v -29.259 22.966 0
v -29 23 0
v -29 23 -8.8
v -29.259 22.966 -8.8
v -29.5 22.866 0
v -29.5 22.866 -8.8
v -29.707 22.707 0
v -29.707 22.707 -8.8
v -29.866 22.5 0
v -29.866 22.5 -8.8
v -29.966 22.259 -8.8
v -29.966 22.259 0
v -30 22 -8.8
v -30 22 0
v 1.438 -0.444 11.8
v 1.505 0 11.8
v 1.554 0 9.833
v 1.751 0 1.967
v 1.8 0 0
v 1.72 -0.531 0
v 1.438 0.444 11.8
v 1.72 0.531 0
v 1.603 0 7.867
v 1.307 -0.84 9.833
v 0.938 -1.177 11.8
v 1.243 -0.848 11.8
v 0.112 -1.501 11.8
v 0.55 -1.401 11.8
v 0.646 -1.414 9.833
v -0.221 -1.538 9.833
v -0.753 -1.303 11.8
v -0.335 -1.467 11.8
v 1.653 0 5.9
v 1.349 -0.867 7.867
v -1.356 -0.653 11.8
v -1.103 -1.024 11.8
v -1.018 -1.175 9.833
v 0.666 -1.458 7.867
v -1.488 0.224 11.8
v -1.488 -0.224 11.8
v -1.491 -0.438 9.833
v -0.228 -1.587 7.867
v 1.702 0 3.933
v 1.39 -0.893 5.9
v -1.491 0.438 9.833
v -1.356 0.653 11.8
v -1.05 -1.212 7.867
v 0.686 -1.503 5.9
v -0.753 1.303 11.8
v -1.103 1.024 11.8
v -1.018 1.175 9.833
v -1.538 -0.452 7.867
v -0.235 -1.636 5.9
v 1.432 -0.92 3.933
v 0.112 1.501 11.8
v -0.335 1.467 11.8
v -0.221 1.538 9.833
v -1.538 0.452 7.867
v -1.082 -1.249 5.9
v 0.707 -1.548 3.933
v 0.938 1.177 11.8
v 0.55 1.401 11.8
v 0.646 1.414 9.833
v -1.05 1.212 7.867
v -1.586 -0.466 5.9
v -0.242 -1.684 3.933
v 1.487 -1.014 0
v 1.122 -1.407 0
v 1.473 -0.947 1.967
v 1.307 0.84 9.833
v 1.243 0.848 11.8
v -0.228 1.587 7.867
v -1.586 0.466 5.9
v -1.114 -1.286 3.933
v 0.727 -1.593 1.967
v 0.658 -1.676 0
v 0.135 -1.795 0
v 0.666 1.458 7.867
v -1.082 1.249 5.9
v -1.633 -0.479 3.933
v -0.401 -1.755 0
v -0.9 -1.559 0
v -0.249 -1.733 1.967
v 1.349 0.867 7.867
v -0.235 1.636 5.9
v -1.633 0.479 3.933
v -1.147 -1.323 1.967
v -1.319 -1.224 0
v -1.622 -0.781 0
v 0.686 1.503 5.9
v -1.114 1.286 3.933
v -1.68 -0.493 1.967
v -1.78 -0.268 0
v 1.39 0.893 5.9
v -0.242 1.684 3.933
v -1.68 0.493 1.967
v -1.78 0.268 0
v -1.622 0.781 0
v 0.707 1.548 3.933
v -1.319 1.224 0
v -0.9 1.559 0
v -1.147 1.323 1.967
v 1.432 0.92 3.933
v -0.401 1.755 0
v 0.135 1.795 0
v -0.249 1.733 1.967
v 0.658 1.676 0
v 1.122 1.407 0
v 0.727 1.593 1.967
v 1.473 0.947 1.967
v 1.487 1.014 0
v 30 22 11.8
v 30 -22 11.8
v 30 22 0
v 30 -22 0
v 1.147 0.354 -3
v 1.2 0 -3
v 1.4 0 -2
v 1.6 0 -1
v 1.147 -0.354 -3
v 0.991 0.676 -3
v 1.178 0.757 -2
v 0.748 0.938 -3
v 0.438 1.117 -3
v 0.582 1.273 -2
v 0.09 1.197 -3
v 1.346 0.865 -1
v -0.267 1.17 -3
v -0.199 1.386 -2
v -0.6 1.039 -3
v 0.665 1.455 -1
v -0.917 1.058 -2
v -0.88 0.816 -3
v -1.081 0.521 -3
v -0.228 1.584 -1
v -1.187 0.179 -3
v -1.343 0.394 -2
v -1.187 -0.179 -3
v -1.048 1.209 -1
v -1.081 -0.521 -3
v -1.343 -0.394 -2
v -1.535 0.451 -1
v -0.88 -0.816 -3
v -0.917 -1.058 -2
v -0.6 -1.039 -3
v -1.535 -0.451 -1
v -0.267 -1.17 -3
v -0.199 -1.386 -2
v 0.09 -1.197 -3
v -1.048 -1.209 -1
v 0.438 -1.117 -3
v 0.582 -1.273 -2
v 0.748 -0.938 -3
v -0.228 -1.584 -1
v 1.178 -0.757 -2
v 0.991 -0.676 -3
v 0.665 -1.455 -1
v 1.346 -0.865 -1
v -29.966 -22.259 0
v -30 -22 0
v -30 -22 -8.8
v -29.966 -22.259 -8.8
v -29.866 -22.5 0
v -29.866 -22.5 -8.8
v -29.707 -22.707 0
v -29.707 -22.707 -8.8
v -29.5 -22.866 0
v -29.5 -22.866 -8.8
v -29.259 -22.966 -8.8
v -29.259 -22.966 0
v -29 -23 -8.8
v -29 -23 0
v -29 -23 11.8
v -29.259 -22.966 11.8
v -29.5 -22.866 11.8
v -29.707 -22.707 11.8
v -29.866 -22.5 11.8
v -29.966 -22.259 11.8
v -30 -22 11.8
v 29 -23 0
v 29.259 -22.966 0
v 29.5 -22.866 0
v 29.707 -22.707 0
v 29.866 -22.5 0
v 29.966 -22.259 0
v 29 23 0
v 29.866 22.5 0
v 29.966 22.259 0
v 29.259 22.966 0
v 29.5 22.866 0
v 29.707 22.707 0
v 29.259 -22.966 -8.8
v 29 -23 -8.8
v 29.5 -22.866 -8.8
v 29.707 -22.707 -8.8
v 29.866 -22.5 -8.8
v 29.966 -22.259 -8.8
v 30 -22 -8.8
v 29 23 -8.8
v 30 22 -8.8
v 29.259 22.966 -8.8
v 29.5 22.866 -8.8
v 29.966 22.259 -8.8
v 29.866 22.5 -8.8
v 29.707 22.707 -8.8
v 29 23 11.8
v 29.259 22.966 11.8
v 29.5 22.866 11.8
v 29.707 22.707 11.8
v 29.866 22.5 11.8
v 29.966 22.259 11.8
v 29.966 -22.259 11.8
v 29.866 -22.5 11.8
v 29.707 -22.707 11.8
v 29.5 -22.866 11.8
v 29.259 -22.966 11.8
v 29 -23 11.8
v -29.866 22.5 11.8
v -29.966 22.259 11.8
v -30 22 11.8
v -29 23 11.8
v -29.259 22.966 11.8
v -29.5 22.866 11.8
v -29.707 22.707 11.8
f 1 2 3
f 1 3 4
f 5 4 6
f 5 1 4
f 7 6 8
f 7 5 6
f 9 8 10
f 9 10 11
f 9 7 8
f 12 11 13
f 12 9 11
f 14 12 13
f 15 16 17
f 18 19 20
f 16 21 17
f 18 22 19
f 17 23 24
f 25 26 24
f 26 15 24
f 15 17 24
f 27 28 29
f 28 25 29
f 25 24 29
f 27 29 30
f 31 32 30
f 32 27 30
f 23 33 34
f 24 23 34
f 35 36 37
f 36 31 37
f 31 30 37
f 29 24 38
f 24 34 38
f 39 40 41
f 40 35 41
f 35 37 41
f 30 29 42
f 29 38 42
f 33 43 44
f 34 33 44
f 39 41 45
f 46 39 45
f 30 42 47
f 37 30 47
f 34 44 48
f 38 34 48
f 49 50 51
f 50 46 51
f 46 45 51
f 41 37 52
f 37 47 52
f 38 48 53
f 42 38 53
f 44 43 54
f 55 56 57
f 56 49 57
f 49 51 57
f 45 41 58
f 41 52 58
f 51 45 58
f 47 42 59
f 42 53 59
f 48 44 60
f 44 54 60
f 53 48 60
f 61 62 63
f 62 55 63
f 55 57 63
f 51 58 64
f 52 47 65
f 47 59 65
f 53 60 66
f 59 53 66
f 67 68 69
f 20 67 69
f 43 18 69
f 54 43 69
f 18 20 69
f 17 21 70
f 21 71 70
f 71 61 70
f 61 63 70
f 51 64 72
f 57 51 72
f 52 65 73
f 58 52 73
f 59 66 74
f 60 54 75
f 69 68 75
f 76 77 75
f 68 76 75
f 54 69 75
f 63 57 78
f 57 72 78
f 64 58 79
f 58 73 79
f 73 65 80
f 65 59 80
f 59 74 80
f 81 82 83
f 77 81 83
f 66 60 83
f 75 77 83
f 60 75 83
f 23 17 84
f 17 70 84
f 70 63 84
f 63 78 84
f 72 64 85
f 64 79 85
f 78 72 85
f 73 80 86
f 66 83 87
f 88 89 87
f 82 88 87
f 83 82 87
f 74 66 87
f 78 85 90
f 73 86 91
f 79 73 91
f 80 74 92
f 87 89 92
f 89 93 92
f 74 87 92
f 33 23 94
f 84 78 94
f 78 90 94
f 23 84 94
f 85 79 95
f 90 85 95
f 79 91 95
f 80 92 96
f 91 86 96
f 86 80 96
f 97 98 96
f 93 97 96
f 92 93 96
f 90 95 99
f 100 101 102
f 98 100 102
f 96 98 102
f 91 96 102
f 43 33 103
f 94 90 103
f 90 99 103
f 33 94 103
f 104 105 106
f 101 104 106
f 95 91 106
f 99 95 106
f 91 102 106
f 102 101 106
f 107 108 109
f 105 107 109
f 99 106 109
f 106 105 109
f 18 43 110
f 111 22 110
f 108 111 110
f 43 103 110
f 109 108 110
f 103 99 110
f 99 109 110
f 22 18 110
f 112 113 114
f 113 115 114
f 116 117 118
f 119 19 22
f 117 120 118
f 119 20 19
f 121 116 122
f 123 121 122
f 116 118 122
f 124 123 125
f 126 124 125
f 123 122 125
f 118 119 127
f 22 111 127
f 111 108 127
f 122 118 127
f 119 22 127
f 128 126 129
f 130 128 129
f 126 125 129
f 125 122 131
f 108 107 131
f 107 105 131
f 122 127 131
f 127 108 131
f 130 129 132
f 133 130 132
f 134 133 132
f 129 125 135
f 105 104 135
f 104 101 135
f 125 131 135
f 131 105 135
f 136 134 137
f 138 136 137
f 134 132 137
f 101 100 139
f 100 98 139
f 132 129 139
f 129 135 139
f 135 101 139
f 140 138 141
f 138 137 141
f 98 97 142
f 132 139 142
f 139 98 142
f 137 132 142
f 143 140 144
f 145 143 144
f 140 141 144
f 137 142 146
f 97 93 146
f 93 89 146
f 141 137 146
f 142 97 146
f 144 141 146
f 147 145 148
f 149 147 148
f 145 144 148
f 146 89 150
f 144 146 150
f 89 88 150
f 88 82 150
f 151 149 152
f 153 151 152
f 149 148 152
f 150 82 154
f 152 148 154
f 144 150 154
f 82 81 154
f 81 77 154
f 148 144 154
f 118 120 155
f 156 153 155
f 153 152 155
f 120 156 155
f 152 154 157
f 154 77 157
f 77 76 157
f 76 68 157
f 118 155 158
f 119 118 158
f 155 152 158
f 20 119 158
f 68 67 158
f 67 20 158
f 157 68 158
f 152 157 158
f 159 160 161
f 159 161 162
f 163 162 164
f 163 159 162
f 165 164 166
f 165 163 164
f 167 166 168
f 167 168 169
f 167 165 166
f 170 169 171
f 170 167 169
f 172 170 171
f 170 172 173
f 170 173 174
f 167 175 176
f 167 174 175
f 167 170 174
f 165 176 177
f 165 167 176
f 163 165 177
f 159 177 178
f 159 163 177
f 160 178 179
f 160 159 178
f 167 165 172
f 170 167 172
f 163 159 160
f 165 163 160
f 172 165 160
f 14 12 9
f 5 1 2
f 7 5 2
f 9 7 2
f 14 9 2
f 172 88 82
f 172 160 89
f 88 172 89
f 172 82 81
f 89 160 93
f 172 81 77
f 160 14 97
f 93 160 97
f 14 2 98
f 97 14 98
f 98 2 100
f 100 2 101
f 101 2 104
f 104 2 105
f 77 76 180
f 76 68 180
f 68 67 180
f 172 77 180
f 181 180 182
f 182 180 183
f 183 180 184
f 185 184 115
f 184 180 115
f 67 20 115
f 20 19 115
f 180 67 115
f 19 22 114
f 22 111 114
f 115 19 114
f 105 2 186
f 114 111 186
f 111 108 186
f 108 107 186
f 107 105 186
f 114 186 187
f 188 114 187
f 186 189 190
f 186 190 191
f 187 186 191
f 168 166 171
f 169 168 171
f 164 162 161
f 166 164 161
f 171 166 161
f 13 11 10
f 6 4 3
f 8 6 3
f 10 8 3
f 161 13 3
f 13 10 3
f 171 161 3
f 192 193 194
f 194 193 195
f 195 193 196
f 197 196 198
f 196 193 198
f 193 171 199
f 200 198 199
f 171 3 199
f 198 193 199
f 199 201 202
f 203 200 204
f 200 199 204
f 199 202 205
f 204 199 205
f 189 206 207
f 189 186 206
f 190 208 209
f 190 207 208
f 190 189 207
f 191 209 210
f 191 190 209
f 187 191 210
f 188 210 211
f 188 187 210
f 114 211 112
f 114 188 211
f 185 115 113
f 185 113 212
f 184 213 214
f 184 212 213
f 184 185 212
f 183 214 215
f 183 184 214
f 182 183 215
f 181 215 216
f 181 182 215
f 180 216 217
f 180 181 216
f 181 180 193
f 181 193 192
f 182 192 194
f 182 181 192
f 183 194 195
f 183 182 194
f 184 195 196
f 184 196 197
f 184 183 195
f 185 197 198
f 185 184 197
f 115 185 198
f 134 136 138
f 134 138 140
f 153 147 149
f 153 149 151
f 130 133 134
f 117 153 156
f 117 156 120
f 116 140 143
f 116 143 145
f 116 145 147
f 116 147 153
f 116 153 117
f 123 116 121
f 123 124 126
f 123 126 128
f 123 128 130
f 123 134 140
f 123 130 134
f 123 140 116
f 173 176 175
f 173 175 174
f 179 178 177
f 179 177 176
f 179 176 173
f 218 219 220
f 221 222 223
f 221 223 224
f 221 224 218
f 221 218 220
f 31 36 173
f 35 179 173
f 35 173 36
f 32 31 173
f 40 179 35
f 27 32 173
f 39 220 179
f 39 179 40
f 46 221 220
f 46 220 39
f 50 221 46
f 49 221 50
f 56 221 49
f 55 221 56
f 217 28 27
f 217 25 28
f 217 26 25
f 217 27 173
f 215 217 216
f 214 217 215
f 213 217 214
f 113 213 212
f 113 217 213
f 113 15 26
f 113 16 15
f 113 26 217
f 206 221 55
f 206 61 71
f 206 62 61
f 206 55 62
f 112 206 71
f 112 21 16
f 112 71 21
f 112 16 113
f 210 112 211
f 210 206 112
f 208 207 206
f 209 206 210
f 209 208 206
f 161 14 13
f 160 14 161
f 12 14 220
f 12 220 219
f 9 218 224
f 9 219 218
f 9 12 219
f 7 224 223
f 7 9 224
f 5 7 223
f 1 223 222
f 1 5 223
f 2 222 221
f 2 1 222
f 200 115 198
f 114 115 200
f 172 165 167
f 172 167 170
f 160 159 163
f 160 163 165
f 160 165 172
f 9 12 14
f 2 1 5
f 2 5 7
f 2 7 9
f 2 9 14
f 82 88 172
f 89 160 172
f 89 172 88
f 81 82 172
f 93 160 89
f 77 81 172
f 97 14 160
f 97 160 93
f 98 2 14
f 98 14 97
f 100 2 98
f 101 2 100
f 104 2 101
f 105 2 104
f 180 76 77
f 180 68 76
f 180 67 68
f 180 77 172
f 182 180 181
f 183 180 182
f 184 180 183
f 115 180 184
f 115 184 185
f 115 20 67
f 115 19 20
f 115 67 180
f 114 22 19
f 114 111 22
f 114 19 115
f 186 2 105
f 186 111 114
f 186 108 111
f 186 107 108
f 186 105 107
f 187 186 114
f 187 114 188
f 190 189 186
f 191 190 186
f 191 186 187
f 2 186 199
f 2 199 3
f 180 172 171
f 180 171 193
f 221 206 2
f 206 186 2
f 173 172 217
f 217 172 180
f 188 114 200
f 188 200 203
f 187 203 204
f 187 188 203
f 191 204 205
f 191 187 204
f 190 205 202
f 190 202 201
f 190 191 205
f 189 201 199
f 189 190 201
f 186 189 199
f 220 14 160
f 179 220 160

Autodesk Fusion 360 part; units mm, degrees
sketch "スケッチ7" plane through (0, 0, 0) normal (0, 0, 1) x (1, 0, 0)
  line L0 (-40, -25) -> (40, -25)
  line L1 (40, -25) -> (40, 25)
  line L2 (40, 25) -> (-40, 25)
  line L3 (-40, 25) -> (-40, -25)
  line L4 (-40, -25) -> (40, 25) construction
  line L5 (40, -25) -> (-40, 25) construction
  line L6 (-40, 0) -> (40, 0) construction
  line L7 (0, -25) -> (0, 25) construction
  circle A0 centre (-35, 20) radius 2.75
  circle A1 centre (35, 20) radius 2.75
  circle A2 centre (-35, -20) radius 2.75
  circle A3 centre (35, -20) radius 2.75
  line L8 (-29, -23) -> (29, -23)
  line L9 (30, -22) -> (30, 22)
  line L10 (29, 23) -> (-29, 23)
  line L11 (-30, 22) -> (-30, -22)
  line L12 (-30, -23) -> (30, 23) construction
  line L13 (30, -23) -> (-30, 23) construction
  arc A4 (-29, 23) -> (-30, 22) centre (-29, 22) ccw
  arc A5 (30, 22) -> (29, 23) centre (29, 22) ccw
  arc A6 (29, -23) -> (30, -22) centre (29, -22) ccw
  arc A7 (-30, -22) -> (-29, -23) centre (-29, -22) ccw
  circle A8 centre (0, 0) radius 1.5
  arc A9 (-6, 23) -> (6, 23) centre (0, 23) ccw
  arc A10 (-30, -8) -> (-30, 8) centre (-30, 0) ccw
  arc A11 (6, -23) -> (-6, -23) centre (0, -23) ccw
  arc A12 (30, 8) -> (30, -8) centre (30, 0) ccw
  dimension "d41" = 50
  dimension "d42" = 80
  dimension "d43" = 5.5
  dimension "d44" = 5
  dimension "d45" = 5
  dimension "d186" = 46
  dimension "d187" = 10
  dimension "d188" = 1
  dimension "d197" = 3
  dimension "d229" = 8
  dimension "d230" = 6
sketch "Runner" plane through (0, 0, 0) normal (0, 0, 1) x (1, 0, 0)
  line L0 (-14.6, 1.8) -> (-14.6, -1.8)
  arc A0 (-23, -0.6) -> (-21.8, -1.8) centre (-21.8, -0.6) ccw
  line L1 (-17, 1.8) -> (17, 1.8) construction
  line L2 (-14.6, 1.8) -> (-15.4, 3.5)
  line L3 (-17, -3.5) -> (-17, 3.5)
  line L4 (17, 1.8) -> (-17, -1.8) construction
  line L5 (0, 1.8) -> (0, -1.8) construction
  line L6 (-17, 3.5) -> (-15.4, 3.5)
  line L7 (-17, -1.8) -> (-17, 1.8)
  line L8 (-25, -3.5) -> (-9, -3.5) construction
  line L9 (-25.0006, 3.5) -> (-8.9994, 3.5) construction
  arc A1 (21.8, -1.8) -> (23, -0.6) centre (21.8, -0.6) ccw
  line L10 (-17, 1.8) -> (17, -1.8) construction
  line L11 (21.8, -1.8) -> (17, -1.8)
  line L12 (17, 1.8) -> (17, -1.8)
  line L13 (-17, 0) -> (17.3464, 0)
  line L14 (17, 0) -> (23, 0)
  line L15 (-17, 0) -> (-23, 0)
  line L16 (-14.6, -1.8) -> (-15.4, -3.5)
  line L17 (23, 0) -> (23, -0.6)
  line L18 (-17, -3.5) -> (-15.4, -3.5)
  line L19 (-15.4, -3.5) -> (-15.4, 3.5)
  line L20 (17, -1.8) -> (-17, -1.8)
  line L21 (-17, -1.8) -> (-17, 0)
  line L22 (-21.8, -1.8) -> (-17, -1.8)
  line L23 (-23, 0) -> (-23, -0.6)
  circle A2 centre (0, 0) radius 1.8
  circle A3 centre (0, 0) radius 1.5
  dimension "d202" = 1.6
  dimension "d204" = 0.8
  dimension "d210" = 6
  dimension "d211" = 1.2
  dimension "d212" = 3.5
  dimension "d213" = 3.5
  dimension "d214" = 3
  dimension "d215" = 3.6
  dimension "d216" = 17
sketch "スケッチ1" plane through (0, 0, 0) normal (0, 0, 1) x (1, 0, 0)
  line L0 (8.5, -3) -> (25.5, -3)
  line L1 (26, -3.5) -> (26, -20.5)
  line L2 (25.5, -21) -> (8.5, -21)
  line L3 (8, -20.5) -> (8, -3.5)
  line L4 (17, -3) -> (17, -21) construction
  line L5 (8, -12) -> (26, -12) construction
  arc A0 (8.5, -3) -> (8, -3.5) centre (8.5, -3.5) ccw
  arc A1 (26, -3.5) -> (25.5, -3) centre (25.5, -3.5) ccw
  arc A2 (25.5, -21) -> (26, -20.5) centre (25.5, -20.5) ccw
  arc A3 (8, -20.5) -> (8.5, -21) centre (8.5, -20.5) ccw
  line L6 (9.7, -4.2) -> (24.3, -4.2)
  line L7 (9.2, -19.3) -> (9.2, -4.7)
  line L8 (24.3, -19.8) -> (9.7, -19.8)
  line L9 (24.8, -4.7) -> (24.8, -19.3)
  arc A4 (9.7, -4.2) -> (9.2, -4.7) centre (9.7, -4.7) ccw
  arc A5 (9.2, -19.3) -> (9.7, -19.8) centre (9.7, -19.3) ccw
  arc A6 (24.3, -19.8) -> (24.8, -19.3) centre (24.3, -19.3) ccw
  arc A7 (24.8, -4.7) -> (24.3, -4.2) centre (24.3, -4.7) ccw
  circle A8 centre (17, -12.03) radius 2.7
  line L10 (14.3525, -11.5) -> (19.6475, -11.5) construction
  line L11 (14.3525, -12.5) -> (19.6475, -12.5) construction
  line L12 (16.5, -9.3767) -> (16.5, -14.6833) construction
  line L13 (17.5, -9.3767) -> (17.5, -14.6833) construction
  line L14 (16.5, -11.5) -> (14.5202, -11.5)
  line L15 (14.5202, -12.5) -> (14.5202, -11.5)
  line L16 (14.5202, -12.5) -> (16.5, -12.5)
  line L17 (15.0202, -11.5) -> (15.0202, -12.5)
  line L18 (16.5, -12.5) -> (16.5, -14.4798)
  line L19 (17.5, -14.4798) -> (17.5, -12.5)
  line L20 (16.5, -13.9798) -> (17.5, -13.9798)
  line L21 (17.5, -14.4798) -> (16.5, -14.4798)
  line L22 (17.5, -12.5) -> (19.4798, -12.5)
  line L23 (19.4798, -11.5) -> (17.5, -11.5)
  line L24 (18.9798, -12.5) -> (18.9798, -11.5)
  line L25 (19.4798, -11.5) -> (19.4798, -12.5)
  line L26 (17.5, -11.5) -> (17.5, -9.5202)
  line L27 (16.5, -9.5202) -> (16.5, -11.5)
  line L28 (17.5, -10.0202) -> (16.5, -10.0202)
  line L29 (16.5, -9.5202) -> (17.5, -9.5202)
  circle A9 centre (13.2, -15.7) radius 1.25
  circle A10 centre (20.8, -15.7) radius 1.25
  point P0 (8, -3)
  point P1 (8, -21)
  point P2 (14.3002, -12)
  point P3 (17, -12)
  dimension "d326" = 18
  dimension "d327" = 18
  dimension "d328" = 8
  dimension "d329" = 3
  dimension "d330" = 0.5
  dimension "d332" = 0.5
  dimension "d333" = 0.03
  dimension "d334" = 5.4
  dimension "d335" = 1.2
  dimension "d336" = 1.2
  dimension "d337" = 1
  dimension "d338" = 1
  dimension "d339" = 0.22
  dimension "d341" = 0.5
  dimension "d343" = 360
  dimension "d366" = 2.5
  dimension "d367" = 12.7
  dimension "d368" = 5.2
ref_plane "作業平面1" through (0, 0, 7.5) normal (0, 0, 1) x (1, 0, 0)
sketch "スケッチ2" plane through (0, 0, 7.5) normal (0, 0, 1) x (1, 0, 0)
  line L0 (8.5, -3) -> (25.5, -3) construction
  line L1 (8, -20.5) -> (8, -3.5) construction
  line L2 (25.5, -21) -> (8.5, -21) construction
  line L3 (26, -3.5) -> (26, -20.5) construction
  arc A0 (26, -3.5) -> (25.5, -3) centre (25.5, -3.5) ccw construction
  arc A1 (8.5, -3) -> (8, -3.5) centre (8.5, -3.5) ccw construction
  arc A2 (8, -20.5) -> (8.5, -21) centre (8.5, -20.5) ccw construction
  arc A3 (25.5, -21) -> (26, -20.5) centre (25.5, -20.5) ccw construction
  line L4 (17, -3) -> (17, -21) construction
  line L5 (8, -12) -> (26, -12) construction
  line L6 (12, -18) -> (22, -18)
  line L7 (23, -17) -> (23, -7)
  line L8 (22, -6) -> (12, -6)
  line L9 (11, -7) -> (11, -17)
  line L10 (11, -18) -> (23, -6) construction
  line L11 (23, -18) -> (11, -6) construction
  arc A4 (12, -6) -> (11, -7) centre (12, -7) ccw
  arc A5 (23, -7) -> (22, -6) centre (22, -7) ccw
  arc A6 (22, -18) -> (23, -17) centre (22, -17) ccw
  arc A7 (11, -17) -> (12, -18) centre (12, -17) ccw
  point P0 (17, -12)
  dimension "d396" = 12
  dimension "d397" = 12
  dimension "d398" = 1
ref_plane "作業平面4" through (0, 0, 6.3) normal (0, 0, 1) x (1, 0, 0)
sketch "スケッチ8" plane through (0, 0, 6.3) normal (0, 0, 1) x (1, 0, 0)
  line L0 (11, -7) -> (11, -17) construction
  line L1 (22, -6) -> (12, -6) construction
  arc A0 (12, -6) -> (11, -7) centre (12, -7) ccw construction
  arc A1 (11, -17) -> (12, -18) centre (12, -17) ccw construction
  line L2 (12, -18) -> (22, -18) construction
  line L3 (23, -17) -> (23, -7) construction
  arc A2 (23, -7) -> (22, -6) centre (22, -7) ccw construction
  arc A3 (22, -18) -> (23, -17) centre (22, -17) ccw construction
  line L4 (21.5, -7) -> (12.5, -7)
  line L5 (12, -7.5) -> (12, -16.5)
  line L6 (12.5, -17) -> (21.5, -17)
  line L7 (22, -16.5) -> (22, -7.5)
  arc A4 (12.5, -7) -> (12, -7.5) centre (12.5, -7.5) ccw
  arc A5 (22, -7.5) -> (21.5, -7) centre (21.5, -7.5) ccw
  arc A6 (21.5, -17) -> (22, -16.5) centre (21.5, -16.5) ccw
  arc A7 (12, -16.5) -> (12.5, -17) centre (12.5, -16.5) ccw
  line L8 (17, -6) -> (17, -18) construction
  line L9 (11, -12) -> (23, -12) construction
  dimension "d400" = 0.5
  dimension "d401" = 1
  dimension "d402" = 1
ref_plane "作業平面10" through (0, -12, 0) normal (0, 1, 0) x (0, 0, 1)
sketch "スケッチ28" plane through (0, -12, 0) normal (0, 1, 0) x (1, 0, 0)
  line L0 (17, -7.5) -> (17, 0) construction
  arc A0 (22, -6.3) -> (24.8, 0) centre (7.2558, 4.0252) ccw
  arc A1 (9.2, 0) -> (12, -6.3) centre (26.7442, 4.0252) ccw
  arc A2 (8, 0) -> (11, -7.5) centre (25.7864, 2.7646) ccw
  arc A3 (23, -7.5) -> (26, 0) centre (8.2136, 2.7646) ccw
  point P0 (17, -7.5)
  point P1 (17, 0)
  point P2 (22, -6.3)
  point P3 (12, -6.3)
  point P4 (24.8, 0)
  point P5 (9.2, 0)
  point P6 (11, -7.5)
  point P7 (23, -7.5)
  point P8 (26, 0)
  point P9 (8, 0)
  dimension "d405" = -12
ref_plane "作業平面11" through (17, -12, 3.75) normal (1, 0, 0) x (0, 0, -1)
ref_plane "作業平面12" through (17, -12, 3.75) normal (0.7071, 0.7071, 0) x (0, 0, -1)
sketch "スケッチ29" plane through (17, -12, 3.6) normal (1, 0, 0) x (0, 1, 0)
  arc A0 (-6, 3.9) -> (-9, -3.6) centre (8.7864, -6.3646) ccw
  line L0 (0, 3.9) -> (-0.03, -3.6)
  arc A1 (9, -3.6) -> (6, 3.9) centre (-8.7864, -6.3646) ccw
  arc A2 (-5, 2.7) -> (-7.8, -3.6) centre (9.7442, -7.6252) ccw
  arc A3 (7.8, -3.6) -> (5, 2.7) centre (-9.7442, -7.6252) ccw
  point P0 (6, 3.9)
  point P1 (-6, 3.9)
  point P2 (-9, -3.6)
  point P3 (0, 3.9)
  point P4 (-0.03, -3.6)
  point P5 (9, -3.6)
  point P6 (-7.8, -3.6)
  point P7 (7.8, -3.6)
  point P8 (-5, 2.7)
  point P9 (5, 2.7)
  dimension "d407" = 18
  dimension "d408" = 18
  dimension "d409" = 18
  dimension "d410" = 18
sketch "スケッチ27" plane through (0, 0, 0) normal (0, 0, 1) x (1, 0, 0)
  line L0 (8, -20.5) -> (8, -3.5) construction
  line L1 (8.5, -3) -> (25.5, -3) construction
  line L2 (26, -3.5) -> (26, -20.5) construction
  line L3 (25.5, -21) -> (8.5, -21) construction
  arc A0 (8, -20.5) -> (8.5, -21) centre (8.5, -20.5) ccw construction
  arc A1 (8.5, -3) -> (8, -3.5) centre (8.5, -3.5) ccw construction
  arc A2 (25.5, -21) -> (26, -20.5) centre (25.5, -20.5) ccw construction
  arc A3 (26, -3.5) -> (25.5, -3) centre (25.5, -3.5) ccw construction
  line L4 (-29, -23) -> (29, -23) construction
  line L5 (-30, 22) -> (-30, -22) construction
  line L6 (29, 23) -> (-29, 23) construction
  line L7 (30, -22) -> (30, 22) construction
  arc A4 (-29, 23) -> (-30, 22) centre (-29, 22) ccw construction
  arc A5 (-30, -22) -> (-29, -23) centre (-29, -22) ccw construction
  arc A6 (30, 22) -> (29, 23) centre (29, 22) ccw construction
  arc A7 (29, -23) -> (30, -22) centre (29, -22) ccw construction
  line L8 (0, -25) -> (0, 25) construction
  line L9 (-40, 0) -> (40, 0) construction
  line L10 (8, -12) -> (-8, -12) construction
  line L11 (-8, -20.5) -> (-8, -3.5) construction
  line L12 (-8, -16) -> (8, -16) construction
  line L13 (-8, -8) -> (8, -8) construction
  point P0 (8, -12)
  dimension "d387" = 2
  dimension "d388" = 4
  dimension "d389" = 2
  dimension "d390" = 2
sketch "スケッチ30" plane through (17, -12, 3.6) normal (0.7071, 0.7071, 0) x (0, 0, -1)
  line L0 (-3.9, -7.7782) -> (-3.9, -8.0711)
  line L1 (-3.9, -0.7071) -> (-3.9, -7.7782)
  line L2 (-3.9, 0.7071) -> (-3.9, -0.7071)
  line L3 (-3.9, 7.7782) -> (-3.9, 0.7071)
  line L4 (-3.9, 8.0711) -> (-3.9, 7.7782)
  line L5 (-2.7, 6.864) -> (-2.7, 6.7175)
  line L6 (-2.7, 6.7175) -> (-2.7, 0.3536)
  line L7 (-2.7, 0.3536) -> (-2.7, -0.3536)
  line L8 (-2.7, -0.3536) -> (-2.7, -6.7175)
  line L9 (-2.7, -6.7175) -> (-2.7, -6.864)
  arc A0 (-3.9, -8.0711) -> (-3.9, 8.0711) centre (-63.3547, 0) ccw
  arc A1 (-2.7, -6.864) -> (-2.7, 6.864) centre (-62.3061, 0) ccw
  line L10 (-3.3547, 0) -> (-3.9, 0)
  line L11 (-2.7, 0) -> (-2.3061, 0)
  dimension "d415" = 60
  dimension "d416" = 60
extrude "Mold" add sketch "スケッチ7" along normal blind 14 contours L0 L1 L2 L3 | L8 L9 L10 L11 A4 A5 A6 A7 A9 A10 A11 A12 | L8 A11 | L11 A10 | L9 A12 | L10 A9 | A8 makes body 1
extrude "Mold (1)" cut sketch "スケッチ7" along normal blind 12 contours L8 L9 L10 L11 A4 A5 A6 A7 A9 A10 A11 A12 | L8 A11 | L11 A10 | L9 A12 | L10 A9 | A8 bodies 1
extrude "Mold (2)" add sketch "スケッチ7" against normal blind 10.5 separate body contours L0 L1 L2 L3 | L8 L9 L10 L11 A4 A5 A6 A7 A9 A10 A11 A12 | L8 A11 | L11 A10 | L9 A12 | L10 A9 | A8 makes body 2
extrude "押し出し30" cut sketch "スケッチ7" along normal blind 24 contours A8 bodies 1
extrude "Mold (3)" cut sketch "スケッチ7" against normal blind 8.8 contours L8 L9 L10 L11 A4 A5 A6 A7 A9 A10 A11 A12 | L8 A11 | L11 A10 | L9 A12 | L10 A9 | A8 bodies 2
sketch "スケッチ14" plane through (0, 0, 0) normal (0, 1, 0) x (1, 0, 0)
  line L0 (1.2, 3) -> (0, 3)
  line L1 (0, 3) -> (0, 0)
  line L2 (1.5, -14) -> (-1.5, -14)
  line L3 (-1.5, -12) -> (1.5, -12)
  line L4 (0, 0) -> (0, -12)
  line L5 (-1.8, 0) -> (1.8, 0)
  line L6 (1.2, 3) -> (1.8, 0)
  line L7 (1.8, 0) -> (1.5, -12)
  dimension "d218" = 1.2
  dimension "d219" = 3
extrude "押し出し5" add sketch "スケッチ7" against normal blind 8.8 separate body contours L8 L9 L10 L11 A4 A5 A6 A7 A9 A10 A11 A12 | L8 A11 | L11 A10 | L9 A12 | L10 A9 | A8 makes body 3
extrude "押し出し8" add sketch "スケッチ7" along normal blind 11.8 separate body contours L8 L9 L10 L11 A4 A5 A6 A7 A9 A10 A11 A12 | L8 A11 | L11 A10 | L9 A12 | L10 A9 | A8 makes body 4
revolve "回転7" cut sketch "スケッチ14" angle 360 about axis through (0, 0, 1.75) along (0, 0, 1) bodies 3 4
hidden bodies 1 2
equation "d334 = ( 2.7 * 2 ) * 1 mm"
